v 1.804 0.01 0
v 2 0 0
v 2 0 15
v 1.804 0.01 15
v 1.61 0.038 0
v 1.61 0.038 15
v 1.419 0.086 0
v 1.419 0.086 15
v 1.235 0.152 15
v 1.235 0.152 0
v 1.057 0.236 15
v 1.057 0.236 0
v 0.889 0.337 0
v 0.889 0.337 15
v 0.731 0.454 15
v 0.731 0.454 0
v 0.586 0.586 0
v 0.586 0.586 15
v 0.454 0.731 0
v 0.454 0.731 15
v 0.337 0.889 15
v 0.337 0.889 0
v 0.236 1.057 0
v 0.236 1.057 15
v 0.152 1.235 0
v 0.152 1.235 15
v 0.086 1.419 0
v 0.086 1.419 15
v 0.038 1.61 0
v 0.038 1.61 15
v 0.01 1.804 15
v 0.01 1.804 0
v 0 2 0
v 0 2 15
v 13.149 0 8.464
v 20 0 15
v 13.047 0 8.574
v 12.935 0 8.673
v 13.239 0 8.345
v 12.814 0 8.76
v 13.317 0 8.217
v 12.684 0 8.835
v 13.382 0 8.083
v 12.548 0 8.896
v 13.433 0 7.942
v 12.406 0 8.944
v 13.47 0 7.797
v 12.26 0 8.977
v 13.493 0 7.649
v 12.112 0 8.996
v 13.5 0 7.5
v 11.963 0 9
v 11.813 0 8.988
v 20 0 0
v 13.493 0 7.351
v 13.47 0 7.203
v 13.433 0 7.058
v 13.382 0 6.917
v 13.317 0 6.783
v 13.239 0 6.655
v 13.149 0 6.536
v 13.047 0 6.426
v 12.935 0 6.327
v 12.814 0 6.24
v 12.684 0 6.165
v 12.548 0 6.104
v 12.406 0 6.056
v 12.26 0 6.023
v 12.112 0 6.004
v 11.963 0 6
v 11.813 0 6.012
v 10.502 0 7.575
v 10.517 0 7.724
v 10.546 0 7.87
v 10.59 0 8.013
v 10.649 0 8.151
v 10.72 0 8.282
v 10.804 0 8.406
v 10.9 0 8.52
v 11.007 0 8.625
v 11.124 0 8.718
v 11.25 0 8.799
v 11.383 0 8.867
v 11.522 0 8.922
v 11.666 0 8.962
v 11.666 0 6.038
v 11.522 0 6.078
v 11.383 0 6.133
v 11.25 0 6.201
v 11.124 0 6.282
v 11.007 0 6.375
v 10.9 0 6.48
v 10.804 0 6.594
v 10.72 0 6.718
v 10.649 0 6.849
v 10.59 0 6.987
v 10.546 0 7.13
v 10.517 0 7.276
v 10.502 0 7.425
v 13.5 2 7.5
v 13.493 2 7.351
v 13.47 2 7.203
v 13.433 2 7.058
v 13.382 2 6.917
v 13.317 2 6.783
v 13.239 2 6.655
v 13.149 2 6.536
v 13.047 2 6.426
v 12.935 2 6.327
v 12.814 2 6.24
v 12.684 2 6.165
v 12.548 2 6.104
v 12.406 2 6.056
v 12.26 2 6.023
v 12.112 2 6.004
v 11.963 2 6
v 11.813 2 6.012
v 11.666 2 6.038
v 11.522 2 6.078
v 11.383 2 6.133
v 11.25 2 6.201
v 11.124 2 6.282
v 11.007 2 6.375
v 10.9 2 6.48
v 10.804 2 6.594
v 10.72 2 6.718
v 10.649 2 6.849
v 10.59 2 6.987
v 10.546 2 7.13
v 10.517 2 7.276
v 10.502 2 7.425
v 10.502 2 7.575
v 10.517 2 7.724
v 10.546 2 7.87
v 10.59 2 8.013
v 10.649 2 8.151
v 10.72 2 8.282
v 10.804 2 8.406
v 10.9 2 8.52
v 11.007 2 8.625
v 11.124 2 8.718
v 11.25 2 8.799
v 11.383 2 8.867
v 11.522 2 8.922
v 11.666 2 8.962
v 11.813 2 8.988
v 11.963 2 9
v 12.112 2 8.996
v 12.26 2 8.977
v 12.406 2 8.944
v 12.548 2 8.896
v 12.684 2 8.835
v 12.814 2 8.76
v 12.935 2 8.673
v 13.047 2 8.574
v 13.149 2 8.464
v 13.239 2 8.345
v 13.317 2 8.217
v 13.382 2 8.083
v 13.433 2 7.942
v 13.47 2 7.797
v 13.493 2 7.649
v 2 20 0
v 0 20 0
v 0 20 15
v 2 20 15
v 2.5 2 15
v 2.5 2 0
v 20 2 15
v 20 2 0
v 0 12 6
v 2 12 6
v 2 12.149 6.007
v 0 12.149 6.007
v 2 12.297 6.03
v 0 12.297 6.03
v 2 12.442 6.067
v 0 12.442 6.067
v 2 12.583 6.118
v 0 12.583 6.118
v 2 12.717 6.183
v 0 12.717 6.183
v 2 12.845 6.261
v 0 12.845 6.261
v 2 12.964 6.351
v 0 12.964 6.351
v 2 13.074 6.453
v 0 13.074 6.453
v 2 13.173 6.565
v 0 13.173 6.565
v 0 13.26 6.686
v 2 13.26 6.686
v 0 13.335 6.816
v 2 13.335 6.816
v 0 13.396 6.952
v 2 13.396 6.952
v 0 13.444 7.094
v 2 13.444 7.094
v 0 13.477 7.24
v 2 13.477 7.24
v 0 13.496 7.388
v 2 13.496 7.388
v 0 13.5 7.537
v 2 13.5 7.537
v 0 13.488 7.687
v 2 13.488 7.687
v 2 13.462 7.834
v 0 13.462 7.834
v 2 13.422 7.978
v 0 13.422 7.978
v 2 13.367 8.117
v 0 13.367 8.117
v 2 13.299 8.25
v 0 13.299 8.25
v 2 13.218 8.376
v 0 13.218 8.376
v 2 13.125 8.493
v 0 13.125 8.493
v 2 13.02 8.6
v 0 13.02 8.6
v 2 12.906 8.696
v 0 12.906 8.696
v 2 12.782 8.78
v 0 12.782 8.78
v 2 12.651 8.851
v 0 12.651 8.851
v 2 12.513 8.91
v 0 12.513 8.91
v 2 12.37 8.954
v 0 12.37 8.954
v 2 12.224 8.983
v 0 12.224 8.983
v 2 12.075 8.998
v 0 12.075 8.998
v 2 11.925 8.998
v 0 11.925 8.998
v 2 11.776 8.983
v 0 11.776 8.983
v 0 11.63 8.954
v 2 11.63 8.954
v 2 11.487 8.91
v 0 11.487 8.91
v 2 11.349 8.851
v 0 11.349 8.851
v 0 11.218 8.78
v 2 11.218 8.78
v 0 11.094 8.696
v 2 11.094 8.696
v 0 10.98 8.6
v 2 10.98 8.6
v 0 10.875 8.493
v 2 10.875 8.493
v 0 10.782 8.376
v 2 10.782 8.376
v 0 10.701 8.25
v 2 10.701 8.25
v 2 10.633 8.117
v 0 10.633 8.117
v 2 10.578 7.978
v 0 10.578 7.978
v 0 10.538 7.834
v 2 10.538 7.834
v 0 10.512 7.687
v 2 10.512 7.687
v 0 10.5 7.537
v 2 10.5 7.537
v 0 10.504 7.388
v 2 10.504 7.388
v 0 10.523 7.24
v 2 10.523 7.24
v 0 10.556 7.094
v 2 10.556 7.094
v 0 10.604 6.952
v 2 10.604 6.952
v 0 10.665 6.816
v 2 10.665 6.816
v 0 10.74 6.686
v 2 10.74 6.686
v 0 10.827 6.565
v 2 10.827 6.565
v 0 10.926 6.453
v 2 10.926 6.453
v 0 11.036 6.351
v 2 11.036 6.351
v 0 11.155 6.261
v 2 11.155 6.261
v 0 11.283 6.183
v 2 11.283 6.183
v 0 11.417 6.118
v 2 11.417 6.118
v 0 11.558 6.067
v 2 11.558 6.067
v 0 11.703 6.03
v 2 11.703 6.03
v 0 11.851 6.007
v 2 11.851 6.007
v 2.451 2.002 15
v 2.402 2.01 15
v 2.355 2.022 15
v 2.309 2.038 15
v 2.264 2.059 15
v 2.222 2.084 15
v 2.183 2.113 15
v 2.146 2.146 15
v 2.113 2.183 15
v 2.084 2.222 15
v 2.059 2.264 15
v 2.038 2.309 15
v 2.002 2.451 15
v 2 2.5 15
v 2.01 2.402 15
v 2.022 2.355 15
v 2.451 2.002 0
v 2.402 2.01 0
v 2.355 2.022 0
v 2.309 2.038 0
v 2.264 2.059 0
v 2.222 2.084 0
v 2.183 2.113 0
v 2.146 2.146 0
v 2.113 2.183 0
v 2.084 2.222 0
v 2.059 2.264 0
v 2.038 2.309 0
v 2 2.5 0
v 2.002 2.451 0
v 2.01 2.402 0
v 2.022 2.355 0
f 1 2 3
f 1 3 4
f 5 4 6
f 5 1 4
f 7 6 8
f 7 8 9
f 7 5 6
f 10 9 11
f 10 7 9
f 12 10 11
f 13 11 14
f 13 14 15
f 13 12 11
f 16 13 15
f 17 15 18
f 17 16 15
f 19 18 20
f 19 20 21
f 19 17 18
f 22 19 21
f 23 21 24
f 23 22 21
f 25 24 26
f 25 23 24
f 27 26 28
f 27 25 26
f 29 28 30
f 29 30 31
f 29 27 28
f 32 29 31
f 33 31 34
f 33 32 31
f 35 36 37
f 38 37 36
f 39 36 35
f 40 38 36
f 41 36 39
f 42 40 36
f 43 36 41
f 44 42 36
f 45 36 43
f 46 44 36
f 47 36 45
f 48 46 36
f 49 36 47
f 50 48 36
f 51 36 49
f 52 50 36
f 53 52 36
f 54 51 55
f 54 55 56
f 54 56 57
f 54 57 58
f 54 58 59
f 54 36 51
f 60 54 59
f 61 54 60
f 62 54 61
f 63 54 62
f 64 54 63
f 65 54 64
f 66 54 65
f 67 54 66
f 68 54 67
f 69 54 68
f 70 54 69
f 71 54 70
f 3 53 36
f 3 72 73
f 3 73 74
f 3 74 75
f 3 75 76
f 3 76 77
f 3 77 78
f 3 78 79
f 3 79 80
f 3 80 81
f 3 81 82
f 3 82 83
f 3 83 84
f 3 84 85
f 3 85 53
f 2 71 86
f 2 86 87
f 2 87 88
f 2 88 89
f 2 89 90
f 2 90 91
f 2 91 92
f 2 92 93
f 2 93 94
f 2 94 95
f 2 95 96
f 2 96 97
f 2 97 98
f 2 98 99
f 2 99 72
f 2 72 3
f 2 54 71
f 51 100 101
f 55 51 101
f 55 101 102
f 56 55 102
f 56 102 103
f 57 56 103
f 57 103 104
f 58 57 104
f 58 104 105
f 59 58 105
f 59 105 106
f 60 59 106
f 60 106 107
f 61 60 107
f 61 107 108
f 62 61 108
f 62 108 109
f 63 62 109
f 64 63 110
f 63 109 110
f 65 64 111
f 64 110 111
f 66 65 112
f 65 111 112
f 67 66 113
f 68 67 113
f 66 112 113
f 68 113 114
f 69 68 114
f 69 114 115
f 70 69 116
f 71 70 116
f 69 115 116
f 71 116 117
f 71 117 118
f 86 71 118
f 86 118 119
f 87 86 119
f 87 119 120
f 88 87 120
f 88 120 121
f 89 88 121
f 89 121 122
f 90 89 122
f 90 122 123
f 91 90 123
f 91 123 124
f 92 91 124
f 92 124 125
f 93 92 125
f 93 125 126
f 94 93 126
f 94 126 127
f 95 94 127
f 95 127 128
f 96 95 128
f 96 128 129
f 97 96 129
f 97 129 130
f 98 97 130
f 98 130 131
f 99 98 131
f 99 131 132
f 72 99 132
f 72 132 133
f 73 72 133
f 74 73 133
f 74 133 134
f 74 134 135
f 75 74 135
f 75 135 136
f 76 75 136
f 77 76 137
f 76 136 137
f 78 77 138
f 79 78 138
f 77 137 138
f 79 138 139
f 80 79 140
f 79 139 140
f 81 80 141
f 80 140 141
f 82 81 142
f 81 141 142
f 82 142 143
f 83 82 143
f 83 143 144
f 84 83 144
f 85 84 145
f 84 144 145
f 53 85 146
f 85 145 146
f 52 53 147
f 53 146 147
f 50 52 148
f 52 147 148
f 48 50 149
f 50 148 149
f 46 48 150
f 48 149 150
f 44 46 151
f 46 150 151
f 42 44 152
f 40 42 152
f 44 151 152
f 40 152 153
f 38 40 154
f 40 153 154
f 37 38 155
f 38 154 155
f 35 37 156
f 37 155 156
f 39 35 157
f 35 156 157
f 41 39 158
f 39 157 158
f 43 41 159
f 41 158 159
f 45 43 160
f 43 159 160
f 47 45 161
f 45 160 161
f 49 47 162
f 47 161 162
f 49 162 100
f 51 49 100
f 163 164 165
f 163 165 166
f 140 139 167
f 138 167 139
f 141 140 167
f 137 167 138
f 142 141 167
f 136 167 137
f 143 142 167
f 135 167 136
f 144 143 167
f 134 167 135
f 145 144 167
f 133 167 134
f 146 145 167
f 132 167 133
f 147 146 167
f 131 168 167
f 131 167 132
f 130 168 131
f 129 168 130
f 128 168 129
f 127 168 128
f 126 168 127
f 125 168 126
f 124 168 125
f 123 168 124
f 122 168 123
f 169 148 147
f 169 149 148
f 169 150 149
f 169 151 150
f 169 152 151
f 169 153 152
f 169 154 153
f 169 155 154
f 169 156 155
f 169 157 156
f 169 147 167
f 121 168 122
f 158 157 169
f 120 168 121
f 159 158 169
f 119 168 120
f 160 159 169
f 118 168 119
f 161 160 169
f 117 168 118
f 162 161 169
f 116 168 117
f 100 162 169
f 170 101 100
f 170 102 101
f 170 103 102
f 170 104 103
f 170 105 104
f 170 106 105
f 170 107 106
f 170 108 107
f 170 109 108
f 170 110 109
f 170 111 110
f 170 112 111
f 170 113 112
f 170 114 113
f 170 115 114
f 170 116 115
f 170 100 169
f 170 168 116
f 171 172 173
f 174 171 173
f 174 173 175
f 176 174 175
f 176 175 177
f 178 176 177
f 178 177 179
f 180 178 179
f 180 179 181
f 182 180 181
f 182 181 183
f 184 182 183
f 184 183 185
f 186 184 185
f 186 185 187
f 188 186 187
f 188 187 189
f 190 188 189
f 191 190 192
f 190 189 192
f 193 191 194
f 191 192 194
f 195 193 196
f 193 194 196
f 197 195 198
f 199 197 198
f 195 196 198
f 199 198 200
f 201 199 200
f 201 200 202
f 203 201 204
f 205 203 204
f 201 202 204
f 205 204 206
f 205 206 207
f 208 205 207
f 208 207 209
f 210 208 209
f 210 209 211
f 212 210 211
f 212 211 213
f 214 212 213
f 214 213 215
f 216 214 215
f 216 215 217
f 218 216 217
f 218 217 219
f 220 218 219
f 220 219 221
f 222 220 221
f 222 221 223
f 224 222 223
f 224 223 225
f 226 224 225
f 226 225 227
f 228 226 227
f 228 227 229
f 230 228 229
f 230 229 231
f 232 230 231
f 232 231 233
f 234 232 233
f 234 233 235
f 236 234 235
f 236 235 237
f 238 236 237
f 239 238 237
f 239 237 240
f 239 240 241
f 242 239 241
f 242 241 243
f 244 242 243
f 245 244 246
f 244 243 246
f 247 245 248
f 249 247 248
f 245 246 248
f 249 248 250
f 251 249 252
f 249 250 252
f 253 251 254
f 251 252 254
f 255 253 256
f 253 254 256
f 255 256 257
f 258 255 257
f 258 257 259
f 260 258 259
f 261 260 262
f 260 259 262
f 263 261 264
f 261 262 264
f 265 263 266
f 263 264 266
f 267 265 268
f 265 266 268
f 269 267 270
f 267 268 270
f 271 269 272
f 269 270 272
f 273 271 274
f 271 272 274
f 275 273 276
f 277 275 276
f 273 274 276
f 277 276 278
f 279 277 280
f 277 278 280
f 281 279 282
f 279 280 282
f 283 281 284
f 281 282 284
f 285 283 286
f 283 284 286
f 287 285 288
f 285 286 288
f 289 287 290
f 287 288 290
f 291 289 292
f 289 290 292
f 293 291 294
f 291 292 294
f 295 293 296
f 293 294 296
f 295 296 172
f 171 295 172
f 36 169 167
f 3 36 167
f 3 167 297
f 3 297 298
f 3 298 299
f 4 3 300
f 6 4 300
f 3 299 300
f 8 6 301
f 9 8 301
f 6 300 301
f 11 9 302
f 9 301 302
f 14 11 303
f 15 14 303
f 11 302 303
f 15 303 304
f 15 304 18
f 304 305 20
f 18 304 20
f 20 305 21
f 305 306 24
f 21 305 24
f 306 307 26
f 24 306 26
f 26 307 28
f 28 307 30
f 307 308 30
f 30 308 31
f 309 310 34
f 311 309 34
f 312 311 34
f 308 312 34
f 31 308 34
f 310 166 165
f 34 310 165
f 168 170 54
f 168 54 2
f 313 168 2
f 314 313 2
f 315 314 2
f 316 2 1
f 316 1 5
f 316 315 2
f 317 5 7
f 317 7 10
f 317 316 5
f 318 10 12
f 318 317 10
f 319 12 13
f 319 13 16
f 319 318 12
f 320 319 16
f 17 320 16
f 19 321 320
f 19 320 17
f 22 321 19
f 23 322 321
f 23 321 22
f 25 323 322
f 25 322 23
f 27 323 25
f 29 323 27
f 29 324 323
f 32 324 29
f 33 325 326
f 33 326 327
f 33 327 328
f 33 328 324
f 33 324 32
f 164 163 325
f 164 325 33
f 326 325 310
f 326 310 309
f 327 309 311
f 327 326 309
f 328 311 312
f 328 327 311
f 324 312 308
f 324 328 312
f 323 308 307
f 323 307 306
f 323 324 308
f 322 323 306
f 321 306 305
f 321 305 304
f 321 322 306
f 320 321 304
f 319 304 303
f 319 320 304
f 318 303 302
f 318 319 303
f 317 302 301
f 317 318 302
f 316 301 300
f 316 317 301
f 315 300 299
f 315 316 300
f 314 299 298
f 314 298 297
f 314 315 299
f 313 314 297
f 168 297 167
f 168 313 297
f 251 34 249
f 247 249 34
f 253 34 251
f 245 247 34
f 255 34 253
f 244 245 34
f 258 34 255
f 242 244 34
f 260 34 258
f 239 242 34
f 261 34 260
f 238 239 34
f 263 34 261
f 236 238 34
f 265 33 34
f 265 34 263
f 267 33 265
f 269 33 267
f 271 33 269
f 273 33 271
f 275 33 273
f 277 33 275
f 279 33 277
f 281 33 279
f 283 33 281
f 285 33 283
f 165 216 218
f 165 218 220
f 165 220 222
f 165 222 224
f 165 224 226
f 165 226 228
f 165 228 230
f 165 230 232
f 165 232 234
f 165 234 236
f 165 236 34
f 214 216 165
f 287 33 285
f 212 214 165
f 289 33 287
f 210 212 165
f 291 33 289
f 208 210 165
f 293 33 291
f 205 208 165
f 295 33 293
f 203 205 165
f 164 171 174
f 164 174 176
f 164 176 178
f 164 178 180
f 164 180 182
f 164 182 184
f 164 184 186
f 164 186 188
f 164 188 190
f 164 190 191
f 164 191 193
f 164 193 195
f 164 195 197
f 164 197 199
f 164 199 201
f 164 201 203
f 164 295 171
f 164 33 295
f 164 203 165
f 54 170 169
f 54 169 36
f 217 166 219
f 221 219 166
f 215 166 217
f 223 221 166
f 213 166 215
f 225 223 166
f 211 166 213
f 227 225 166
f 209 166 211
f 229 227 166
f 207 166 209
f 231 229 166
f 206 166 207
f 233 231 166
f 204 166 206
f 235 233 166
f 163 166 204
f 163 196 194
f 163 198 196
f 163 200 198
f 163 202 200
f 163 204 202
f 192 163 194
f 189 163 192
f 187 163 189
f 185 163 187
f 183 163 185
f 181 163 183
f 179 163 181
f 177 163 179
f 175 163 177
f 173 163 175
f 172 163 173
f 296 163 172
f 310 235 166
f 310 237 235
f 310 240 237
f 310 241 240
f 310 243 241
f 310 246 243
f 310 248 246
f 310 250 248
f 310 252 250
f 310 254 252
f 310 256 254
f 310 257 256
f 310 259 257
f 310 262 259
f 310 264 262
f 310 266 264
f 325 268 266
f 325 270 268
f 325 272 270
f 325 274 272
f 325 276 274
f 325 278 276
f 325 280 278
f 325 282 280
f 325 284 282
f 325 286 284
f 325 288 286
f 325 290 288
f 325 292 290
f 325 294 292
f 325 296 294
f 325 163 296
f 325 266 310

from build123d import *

# Parameters (mm, degrees)
BOSS_EXTRUDE1_DEPTH = 15
SKETCH3_R           = 1.5
CUT_EXTRUDE2_DEPTH  = 3
SKETCH4_R           = 1.5
CUT_EXTRUDE3_DEPTH  = 3


with BuildPart() as part:
    # Sketch1 → Boss-Extrude1 (new body)
    with BuildSketch(Plane.XY):
        with BuildLine():
            Line((0, 2), (0, 20))
            Line((0, 20), (2, 20))
            Line((2, 20), (2, 2.5))
            ThreePointArc((2, 2.5), (2.146446609, 2.146446609), (2.5, 2))
            Line((2.5, 2), (20, 2))
            Line((20, 2), (20, 0))
            Line((20, 0), (2, 0))
            ThreePointArc((2, 0), (0.585786438, 0.585786438), (0, 2))
        make_face()
    extrude(amount=BOSS_EXTRUDE1_DEPTH)

    # Sketch3 → Cut-Extrude2 (cut, through all)
    with BuildSketch(Plane(origin=(0, 2, 0), x_dir=(1, 0, 0), z_dir=(0, 1, 0))):
        with Locations((12, -7.5)):
            Circle(SKETCH3_R)
    extrude(amount=-CUT_EXTRUDE2_DEPTH, mode=Mode.SUBTRACT)

    # Sketch4 → Cut-Extrude3 (cut, through all)
    with BuildSketch(Plane(origin=(2, 0, 0), x_dir=(0, 0, -1), z_dir=(1, 0, 0))):
        with Locations((-7.5, 12)):
            Circle(SKETCH4_R)
    extrude(amount=-CUT_EXTRUDE3_DEPTH, mode=Mode.SUBTRACT)


solid = part.part
